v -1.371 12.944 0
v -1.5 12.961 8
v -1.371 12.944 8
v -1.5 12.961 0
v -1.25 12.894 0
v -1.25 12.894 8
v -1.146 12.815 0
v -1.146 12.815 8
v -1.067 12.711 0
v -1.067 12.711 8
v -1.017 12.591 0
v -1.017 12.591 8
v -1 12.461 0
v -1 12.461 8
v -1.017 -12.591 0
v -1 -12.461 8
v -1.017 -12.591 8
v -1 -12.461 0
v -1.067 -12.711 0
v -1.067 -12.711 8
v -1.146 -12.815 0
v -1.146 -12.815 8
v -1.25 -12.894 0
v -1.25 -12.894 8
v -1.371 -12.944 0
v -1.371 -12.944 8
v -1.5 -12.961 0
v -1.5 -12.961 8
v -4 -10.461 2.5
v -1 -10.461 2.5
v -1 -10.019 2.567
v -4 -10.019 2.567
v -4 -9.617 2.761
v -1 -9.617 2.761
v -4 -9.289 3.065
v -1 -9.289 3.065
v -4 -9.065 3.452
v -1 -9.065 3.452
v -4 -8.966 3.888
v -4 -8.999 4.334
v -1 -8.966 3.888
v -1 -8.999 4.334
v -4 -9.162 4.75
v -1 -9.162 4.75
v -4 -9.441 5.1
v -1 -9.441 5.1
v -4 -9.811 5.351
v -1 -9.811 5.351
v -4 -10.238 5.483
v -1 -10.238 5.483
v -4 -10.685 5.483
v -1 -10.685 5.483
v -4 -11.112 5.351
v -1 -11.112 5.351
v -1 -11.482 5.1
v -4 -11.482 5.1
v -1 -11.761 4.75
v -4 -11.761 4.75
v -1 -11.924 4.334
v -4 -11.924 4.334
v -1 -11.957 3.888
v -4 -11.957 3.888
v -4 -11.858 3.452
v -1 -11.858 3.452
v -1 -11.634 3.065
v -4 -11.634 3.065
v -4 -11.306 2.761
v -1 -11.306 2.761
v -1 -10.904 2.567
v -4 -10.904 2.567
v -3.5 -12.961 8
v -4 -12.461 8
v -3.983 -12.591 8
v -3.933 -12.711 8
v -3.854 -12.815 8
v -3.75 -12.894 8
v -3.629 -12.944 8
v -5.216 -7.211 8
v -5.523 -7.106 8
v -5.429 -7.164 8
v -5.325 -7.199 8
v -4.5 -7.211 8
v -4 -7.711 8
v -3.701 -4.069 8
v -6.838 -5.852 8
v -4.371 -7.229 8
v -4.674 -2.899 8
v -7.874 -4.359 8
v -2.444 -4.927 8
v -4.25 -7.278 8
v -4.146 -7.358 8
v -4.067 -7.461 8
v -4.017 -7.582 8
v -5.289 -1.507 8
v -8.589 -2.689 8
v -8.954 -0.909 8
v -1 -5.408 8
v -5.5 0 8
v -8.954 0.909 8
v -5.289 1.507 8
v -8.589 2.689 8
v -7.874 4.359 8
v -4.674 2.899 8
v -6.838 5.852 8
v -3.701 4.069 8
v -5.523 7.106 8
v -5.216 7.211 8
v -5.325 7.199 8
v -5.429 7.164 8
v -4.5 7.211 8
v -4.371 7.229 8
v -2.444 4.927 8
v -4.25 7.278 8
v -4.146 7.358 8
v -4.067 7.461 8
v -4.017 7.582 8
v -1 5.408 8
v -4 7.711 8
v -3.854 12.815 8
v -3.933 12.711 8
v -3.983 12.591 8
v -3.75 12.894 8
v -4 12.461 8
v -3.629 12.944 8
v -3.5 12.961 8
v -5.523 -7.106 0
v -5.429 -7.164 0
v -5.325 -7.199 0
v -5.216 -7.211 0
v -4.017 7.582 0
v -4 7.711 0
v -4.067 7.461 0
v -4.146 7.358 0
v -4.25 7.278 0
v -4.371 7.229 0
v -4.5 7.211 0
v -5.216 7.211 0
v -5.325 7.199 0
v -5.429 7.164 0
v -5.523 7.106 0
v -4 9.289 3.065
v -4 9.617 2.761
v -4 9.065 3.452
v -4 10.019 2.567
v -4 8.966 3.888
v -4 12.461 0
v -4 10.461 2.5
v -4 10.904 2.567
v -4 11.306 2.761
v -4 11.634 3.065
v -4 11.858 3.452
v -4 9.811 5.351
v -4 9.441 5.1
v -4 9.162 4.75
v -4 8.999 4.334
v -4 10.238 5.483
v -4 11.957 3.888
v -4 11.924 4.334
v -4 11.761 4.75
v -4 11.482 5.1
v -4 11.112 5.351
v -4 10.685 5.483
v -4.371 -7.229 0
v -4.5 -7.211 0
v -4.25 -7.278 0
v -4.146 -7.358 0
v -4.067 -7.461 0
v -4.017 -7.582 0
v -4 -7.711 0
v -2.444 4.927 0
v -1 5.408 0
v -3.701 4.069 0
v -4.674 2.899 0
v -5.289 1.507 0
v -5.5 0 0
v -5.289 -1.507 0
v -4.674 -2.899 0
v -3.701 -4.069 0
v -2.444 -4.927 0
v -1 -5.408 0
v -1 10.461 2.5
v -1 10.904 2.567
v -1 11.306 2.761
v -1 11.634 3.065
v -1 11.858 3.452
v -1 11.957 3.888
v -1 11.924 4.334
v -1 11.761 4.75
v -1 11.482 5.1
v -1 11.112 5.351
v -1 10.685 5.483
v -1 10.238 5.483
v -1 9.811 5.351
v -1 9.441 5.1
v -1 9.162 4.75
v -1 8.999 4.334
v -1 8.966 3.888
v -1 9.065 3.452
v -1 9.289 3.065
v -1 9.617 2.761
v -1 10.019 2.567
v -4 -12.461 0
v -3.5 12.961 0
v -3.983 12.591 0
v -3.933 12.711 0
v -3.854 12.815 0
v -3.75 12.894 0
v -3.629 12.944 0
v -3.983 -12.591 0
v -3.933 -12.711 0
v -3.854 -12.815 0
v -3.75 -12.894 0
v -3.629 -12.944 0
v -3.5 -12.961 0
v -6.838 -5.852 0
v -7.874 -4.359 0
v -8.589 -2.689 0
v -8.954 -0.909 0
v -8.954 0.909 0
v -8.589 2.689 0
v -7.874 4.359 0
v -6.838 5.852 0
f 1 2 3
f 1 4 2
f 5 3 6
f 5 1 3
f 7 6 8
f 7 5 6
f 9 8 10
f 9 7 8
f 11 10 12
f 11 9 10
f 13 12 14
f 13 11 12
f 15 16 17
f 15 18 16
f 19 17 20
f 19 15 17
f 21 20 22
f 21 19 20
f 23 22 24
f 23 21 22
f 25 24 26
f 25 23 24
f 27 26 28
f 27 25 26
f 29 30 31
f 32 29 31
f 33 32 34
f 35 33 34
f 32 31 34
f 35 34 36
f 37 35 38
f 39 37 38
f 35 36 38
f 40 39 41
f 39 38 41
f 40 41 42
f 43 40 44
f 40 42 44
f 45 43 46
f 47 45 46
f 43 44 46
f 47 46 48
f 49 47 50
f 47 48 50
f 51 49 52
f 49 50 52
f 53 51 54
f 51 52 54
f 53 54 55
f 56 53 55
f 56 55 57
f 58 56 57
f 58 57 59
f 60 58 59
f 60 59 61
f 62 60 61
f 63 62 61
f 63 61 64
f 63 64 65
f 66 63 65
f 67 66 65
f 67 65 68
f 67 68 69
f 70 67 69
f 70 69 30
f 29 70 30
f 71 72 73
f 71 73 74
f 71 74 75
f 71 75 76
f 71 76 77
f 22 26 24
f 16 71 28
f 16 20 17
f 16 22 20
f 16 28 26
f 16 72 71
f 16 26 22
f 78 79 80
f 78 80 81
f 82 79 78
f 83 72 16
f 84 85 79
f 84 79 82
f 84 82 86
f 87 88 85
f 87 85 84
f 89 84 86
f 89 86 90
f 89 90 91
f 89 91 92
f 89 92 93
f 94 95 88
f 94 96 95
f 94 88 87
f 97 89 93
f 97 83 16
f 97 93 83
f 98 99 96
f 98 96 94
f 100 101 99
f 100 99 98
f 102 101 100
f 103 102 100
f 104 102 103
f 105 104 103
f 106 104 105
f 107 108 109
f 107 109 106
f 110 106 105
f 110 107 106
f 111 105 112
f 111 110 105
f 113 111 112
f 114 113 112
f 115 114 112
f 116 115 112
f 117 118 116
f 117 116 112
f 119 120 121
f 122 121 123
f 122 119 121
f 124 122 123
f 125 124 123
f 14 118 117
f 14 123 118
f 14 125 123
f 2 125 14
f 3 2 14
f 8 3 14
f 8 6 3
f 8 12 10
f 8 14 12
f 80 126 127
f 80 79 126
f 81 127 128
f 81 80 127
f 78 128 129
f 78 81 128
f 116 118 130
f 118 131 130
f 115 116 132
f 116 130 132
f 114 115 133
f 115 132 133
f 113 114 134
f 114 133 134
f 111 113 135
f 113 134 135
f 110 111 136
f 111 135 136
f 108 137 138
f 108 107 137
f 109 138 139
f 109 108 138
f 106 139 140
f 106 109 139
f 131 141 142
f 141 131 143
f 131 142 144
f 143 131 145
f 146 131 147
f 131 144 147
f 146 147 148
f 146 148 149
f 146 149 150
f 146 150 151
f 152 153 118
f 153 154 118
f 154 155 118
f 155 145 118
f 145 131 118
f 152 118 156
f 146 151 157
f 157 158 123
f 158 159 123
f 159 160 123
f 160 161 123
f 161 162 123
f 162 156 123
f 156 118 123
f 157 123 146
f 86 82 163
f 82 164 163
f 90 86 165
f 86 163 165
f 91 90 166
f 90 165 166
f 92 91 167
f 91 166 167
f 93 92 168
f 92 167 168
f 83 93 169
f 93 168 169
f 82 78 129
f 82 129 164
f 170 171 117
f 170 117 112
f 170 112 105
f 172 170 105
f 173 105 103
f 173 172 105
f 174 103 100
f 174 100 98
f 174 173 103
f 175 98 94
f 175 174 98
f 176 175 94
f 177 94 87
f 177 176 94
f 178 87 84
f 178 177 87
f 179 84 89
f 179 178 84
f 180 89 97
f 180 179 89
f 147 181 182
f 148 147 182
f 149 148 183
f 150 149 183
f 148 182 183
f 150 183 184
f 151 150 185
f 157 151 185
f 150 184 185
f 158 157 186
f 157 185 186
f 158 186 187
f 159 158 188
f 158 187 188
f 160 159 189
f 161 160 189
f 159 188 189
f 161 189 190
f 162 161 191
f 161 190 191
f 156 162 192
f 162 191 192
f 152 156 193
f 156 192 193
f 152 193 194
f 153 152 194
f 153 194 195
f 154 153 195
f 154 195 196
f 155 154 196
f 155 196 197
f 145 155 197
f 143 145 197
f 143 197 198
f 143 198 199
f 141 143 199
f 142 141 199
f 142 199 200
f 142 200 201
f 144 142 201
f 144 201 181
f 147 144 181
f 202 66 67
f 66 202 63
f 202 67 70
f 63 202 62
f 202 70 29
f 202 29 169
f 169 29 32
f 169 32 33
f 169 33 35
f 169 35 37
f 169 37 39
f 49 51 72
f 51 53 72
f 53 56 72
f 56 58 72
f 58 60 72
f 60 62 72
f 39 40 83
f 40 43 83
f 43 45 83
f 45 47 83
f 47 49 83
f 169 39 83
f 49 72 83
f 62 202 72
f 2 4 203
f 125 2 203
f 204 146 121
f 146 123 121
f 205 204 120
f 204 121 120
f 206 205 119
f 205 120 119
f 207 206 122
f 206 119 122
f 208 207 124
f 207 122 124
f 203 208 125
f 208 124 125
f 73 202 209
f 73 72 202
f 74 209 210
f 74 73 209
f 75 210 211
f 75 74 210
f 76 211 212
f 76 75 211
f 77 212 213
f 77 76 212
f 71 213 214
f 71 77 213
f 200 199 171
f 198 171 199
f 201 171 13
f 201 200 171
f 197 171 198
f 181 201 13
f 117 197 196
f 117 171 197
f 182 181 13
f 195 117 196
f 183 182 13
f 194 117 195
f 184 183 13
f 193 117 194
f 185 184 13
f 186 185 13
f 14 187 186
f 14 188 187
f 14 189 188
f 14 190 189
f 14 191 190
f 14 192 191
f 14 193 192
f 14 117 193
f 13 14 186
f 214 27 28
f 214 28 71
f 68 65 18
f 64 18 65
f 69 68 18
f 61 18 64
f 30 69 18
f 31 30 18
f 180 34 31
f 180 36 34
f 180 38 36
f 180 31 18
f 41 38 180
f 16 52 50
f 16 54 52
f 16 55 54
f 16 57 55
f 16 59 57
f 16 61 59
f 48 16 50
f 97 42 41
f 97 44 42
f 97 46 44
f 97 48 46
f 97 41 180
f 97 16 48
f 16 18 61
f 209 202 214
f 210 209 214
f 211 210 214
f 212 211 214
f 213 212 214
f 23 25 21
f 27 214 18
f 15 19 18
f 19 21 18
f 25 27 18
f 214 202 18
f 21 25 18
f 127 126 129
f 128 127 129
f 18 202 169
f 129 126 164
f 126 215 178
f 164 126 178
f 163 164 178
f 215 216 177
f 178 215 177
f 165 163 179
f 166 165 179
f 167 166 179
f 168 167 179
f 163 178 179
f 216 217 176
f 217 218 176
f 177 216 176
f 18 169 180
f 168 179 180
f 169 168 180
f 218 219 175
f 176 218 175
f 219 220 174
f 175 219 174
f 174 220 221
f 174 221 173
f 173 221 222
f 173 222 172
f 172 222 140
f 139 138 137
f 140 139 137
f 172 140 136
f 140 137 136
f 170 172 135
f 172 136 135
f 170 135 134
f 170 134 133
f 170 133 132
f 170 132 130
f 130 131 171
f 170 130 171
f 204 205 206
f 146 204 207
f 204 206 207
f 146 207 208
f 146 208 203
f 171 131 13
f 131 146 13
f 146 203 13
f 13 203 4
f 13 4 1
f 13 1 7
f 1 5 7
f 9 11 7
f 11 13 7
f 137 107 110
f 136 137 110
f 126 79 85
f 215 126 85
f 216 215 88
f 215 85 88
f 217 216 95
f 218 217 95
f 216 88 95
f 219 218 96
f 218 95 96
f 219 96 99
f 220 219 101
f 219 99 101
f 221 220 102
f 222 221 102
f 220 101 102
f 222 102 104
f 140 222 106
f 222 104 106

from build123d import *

# Parameters (mm, degrees)
ESQUISSE1_R             = 13
ESQUISSE1_R_2           = 5.5
BOSS_EXTRU_1_DEPTH      = 8
ESQUISSE2_W             = 32.31004566
ESQUISSE2_H             = 49.818141682
ENL_V_MAT_EXTRU_1_DEPTH = 8
ESQUISSE3_R             = 1.5
ENL_V_MAT_EXTRU_2_DEPTH = 8
ESQUISSE4_W             = 24.87123002
ESQUISSE4_H             = 13.833010023
ESQUISSE4_W_2           = 23.432073676
ESQUISSE4_H_2           = 10.309386407
ENL_V_MAT_EXTRU_3_DEPTH = 8
ENL_V_MAT_EXTRU_4_DEPTH = 8
ESQUISSE7_W             = 3
ESQUISSE7_H             = 5.75
BOSS_EXTRU_3_DEPTH      = 8
ESQUISSE11_R            = 1.5
ENL_V_MAT_EXTRU_5_DEPTH = 8
CONG_5_R                = 0.5
CONG_6_R                = 0.5
CONG_7_R                = 0.5
CONG_8_R                = 0.5


with BuildPart() as part:
    # Esquisse1 → Boss.-Extru.1 (new body)
    with BuildSketch(Plane.XY):
        Circle(ESQUISSE1_R)
        Circle(ESQUISSE1_R_2, mode=Mode.SUBTRACT)
    extrude(amount=BOSS_EXTRU_1_DEPTH)

    # Esquisse2 → Enlèv. mat.-Extru.1 (cut)
    with BuildSketch(Plane.XY.offset(8)):
        with Locations((15.15502283, -0.665904075)):
            Rectangle(ESQUISSE2_W, ESQUISSE2_H)
    extrude(amount=-ENL_V_MAT_EXTRU_1_DEPTH, mode=Mode.SUBTRACT)

    # Esquisse3 → Enlèv. mat.-Extru.2 (cut)
    with BuildSketch(Plane(origin=(-1, 0, 0), x_dir=(0, 0, -1), z_dir=(1, 0, 0))):
        with Locations((-4, 10.461481397)):
            Circle(ESQUISSE3_R)
        with Locations((-4, -10.461481397)):
            Circle(ESQUISSE3_R)
    extrude(amount=-ENL_V_MAT_EXTRU_2_DEPTH, mode=Mode.SUBTRACT)

    # Esquisse4 → Enlèv. mat.-Extru.3 (cut)
    with BuildSketch(Plane.XY.offset(8)):
        with Locations((-16.43561501, 14.127986408)):
            Rectangle(ESQUISSE4_W, ESQUISSE4_H)
        with Locations((-15.716036838, -12.366174601)):
            Rectangle(ESQUISSE4_W_2, ESQUISSE4_H_2)
    extrude(amount=-ENL_V_MAT_EXTRU_3_DEPTH, mode=Mode.SUBTRACT)

    # Esquisse6 → Enlèv. mat.-Extru.4 (cut)
    with BuildSketch(Plane.XY.offset(8)):
        with BuildLine():
            Line((-14.689217928, -10.049334481), (-4.81866764, -7.601344761))
            ThreePointArc((-4.81866764, -7.601344761), (-8.998001154, 0.189671363), (-4.494067947, 7.797650498))
            Line((-4.494067947, 7.797650498), (-11.133481596, 10.892455097))
            ThreePointArc((-11.133481596, 10.892455097), (-17.721132871, 1.238220245), (-14.689217928, -10.049334481))
        make_face()
    extrude(amount=-ENL_V_MAT_EXTRU_4_DEPTH, mode=Mode.SUBTRACT)

    # Esquisse7 → Boss.-Extru.3 (add)
    with BuildSketch(Plane(origin=(0, 0, 0), x_dir=(-1, 0, 0), z_dir=(0, 0, -1))):
        with Locations((2.5, 10.086481397)):
            Rectangle(ESQUISSE7_W, ESQUISSE7_H)
        with Locations((2.5, -10.086481397)):
            Rectangle(ESQUISSE7_W, ESQUISSE7_H)
    extrude(amount=-BOSS_EXTRU_3_DEPTH)

    # Esquisse11 → Enlèv. mat.-Extru.5 (cut)
    with BuildSketch(Plane(origin=(-1, 0, 0), x_dir=(0, 0, -1), z_dir=(1, 0, 0))):
        with Locations((-4, 10.461481397)):
            Circle(ESQUISSE11_R)
        with Locations((-4, -10.461481397)):
            Circle(ESQUISSE11_R)
    extrude(amount=-ENL_V_MAT_EXTRU_5_DEPTH, mode=Mode.SUBTRACT)

    # Congé5
    cong_5_edges = [part.edges().sort_by_distance(p)[0] for p in [
        (-4, 12.961481397, 4),
        (-4, -12.961481397, 4),
    ]]
    fillet(cong_5_edges, radius=CONG_5_R)

    # Congé6
    cong_6_edges = [part.edges().sort_by_distance(p)[0] for p in [
        (-4, 7.211481397, 4),
        (-4, -7.211481397, 4),
    ]]
    fillet(cong_6_edges, radius=CONG_6_R)

    # Congé7
    cong_7_edges = [part.edges().sort_by_distance(p)[0] for p in [
        (-1, 12.961481397, 4),
        (-1, -12.961481397, 4),
    ]]
    fillet(cong_7_edges, radius=CONG_7_R)

    # Congé8
    cong_8_edges = [part.edges().sort_by_distance(p)[0] for p in [
        (-5.384657469, 7.211481397, 4),
        (-5.384657469, -7.211481397, 4),
    ]]
    fillet(cong_8_edges, radius=CONG_8_R)


solid = part.part
